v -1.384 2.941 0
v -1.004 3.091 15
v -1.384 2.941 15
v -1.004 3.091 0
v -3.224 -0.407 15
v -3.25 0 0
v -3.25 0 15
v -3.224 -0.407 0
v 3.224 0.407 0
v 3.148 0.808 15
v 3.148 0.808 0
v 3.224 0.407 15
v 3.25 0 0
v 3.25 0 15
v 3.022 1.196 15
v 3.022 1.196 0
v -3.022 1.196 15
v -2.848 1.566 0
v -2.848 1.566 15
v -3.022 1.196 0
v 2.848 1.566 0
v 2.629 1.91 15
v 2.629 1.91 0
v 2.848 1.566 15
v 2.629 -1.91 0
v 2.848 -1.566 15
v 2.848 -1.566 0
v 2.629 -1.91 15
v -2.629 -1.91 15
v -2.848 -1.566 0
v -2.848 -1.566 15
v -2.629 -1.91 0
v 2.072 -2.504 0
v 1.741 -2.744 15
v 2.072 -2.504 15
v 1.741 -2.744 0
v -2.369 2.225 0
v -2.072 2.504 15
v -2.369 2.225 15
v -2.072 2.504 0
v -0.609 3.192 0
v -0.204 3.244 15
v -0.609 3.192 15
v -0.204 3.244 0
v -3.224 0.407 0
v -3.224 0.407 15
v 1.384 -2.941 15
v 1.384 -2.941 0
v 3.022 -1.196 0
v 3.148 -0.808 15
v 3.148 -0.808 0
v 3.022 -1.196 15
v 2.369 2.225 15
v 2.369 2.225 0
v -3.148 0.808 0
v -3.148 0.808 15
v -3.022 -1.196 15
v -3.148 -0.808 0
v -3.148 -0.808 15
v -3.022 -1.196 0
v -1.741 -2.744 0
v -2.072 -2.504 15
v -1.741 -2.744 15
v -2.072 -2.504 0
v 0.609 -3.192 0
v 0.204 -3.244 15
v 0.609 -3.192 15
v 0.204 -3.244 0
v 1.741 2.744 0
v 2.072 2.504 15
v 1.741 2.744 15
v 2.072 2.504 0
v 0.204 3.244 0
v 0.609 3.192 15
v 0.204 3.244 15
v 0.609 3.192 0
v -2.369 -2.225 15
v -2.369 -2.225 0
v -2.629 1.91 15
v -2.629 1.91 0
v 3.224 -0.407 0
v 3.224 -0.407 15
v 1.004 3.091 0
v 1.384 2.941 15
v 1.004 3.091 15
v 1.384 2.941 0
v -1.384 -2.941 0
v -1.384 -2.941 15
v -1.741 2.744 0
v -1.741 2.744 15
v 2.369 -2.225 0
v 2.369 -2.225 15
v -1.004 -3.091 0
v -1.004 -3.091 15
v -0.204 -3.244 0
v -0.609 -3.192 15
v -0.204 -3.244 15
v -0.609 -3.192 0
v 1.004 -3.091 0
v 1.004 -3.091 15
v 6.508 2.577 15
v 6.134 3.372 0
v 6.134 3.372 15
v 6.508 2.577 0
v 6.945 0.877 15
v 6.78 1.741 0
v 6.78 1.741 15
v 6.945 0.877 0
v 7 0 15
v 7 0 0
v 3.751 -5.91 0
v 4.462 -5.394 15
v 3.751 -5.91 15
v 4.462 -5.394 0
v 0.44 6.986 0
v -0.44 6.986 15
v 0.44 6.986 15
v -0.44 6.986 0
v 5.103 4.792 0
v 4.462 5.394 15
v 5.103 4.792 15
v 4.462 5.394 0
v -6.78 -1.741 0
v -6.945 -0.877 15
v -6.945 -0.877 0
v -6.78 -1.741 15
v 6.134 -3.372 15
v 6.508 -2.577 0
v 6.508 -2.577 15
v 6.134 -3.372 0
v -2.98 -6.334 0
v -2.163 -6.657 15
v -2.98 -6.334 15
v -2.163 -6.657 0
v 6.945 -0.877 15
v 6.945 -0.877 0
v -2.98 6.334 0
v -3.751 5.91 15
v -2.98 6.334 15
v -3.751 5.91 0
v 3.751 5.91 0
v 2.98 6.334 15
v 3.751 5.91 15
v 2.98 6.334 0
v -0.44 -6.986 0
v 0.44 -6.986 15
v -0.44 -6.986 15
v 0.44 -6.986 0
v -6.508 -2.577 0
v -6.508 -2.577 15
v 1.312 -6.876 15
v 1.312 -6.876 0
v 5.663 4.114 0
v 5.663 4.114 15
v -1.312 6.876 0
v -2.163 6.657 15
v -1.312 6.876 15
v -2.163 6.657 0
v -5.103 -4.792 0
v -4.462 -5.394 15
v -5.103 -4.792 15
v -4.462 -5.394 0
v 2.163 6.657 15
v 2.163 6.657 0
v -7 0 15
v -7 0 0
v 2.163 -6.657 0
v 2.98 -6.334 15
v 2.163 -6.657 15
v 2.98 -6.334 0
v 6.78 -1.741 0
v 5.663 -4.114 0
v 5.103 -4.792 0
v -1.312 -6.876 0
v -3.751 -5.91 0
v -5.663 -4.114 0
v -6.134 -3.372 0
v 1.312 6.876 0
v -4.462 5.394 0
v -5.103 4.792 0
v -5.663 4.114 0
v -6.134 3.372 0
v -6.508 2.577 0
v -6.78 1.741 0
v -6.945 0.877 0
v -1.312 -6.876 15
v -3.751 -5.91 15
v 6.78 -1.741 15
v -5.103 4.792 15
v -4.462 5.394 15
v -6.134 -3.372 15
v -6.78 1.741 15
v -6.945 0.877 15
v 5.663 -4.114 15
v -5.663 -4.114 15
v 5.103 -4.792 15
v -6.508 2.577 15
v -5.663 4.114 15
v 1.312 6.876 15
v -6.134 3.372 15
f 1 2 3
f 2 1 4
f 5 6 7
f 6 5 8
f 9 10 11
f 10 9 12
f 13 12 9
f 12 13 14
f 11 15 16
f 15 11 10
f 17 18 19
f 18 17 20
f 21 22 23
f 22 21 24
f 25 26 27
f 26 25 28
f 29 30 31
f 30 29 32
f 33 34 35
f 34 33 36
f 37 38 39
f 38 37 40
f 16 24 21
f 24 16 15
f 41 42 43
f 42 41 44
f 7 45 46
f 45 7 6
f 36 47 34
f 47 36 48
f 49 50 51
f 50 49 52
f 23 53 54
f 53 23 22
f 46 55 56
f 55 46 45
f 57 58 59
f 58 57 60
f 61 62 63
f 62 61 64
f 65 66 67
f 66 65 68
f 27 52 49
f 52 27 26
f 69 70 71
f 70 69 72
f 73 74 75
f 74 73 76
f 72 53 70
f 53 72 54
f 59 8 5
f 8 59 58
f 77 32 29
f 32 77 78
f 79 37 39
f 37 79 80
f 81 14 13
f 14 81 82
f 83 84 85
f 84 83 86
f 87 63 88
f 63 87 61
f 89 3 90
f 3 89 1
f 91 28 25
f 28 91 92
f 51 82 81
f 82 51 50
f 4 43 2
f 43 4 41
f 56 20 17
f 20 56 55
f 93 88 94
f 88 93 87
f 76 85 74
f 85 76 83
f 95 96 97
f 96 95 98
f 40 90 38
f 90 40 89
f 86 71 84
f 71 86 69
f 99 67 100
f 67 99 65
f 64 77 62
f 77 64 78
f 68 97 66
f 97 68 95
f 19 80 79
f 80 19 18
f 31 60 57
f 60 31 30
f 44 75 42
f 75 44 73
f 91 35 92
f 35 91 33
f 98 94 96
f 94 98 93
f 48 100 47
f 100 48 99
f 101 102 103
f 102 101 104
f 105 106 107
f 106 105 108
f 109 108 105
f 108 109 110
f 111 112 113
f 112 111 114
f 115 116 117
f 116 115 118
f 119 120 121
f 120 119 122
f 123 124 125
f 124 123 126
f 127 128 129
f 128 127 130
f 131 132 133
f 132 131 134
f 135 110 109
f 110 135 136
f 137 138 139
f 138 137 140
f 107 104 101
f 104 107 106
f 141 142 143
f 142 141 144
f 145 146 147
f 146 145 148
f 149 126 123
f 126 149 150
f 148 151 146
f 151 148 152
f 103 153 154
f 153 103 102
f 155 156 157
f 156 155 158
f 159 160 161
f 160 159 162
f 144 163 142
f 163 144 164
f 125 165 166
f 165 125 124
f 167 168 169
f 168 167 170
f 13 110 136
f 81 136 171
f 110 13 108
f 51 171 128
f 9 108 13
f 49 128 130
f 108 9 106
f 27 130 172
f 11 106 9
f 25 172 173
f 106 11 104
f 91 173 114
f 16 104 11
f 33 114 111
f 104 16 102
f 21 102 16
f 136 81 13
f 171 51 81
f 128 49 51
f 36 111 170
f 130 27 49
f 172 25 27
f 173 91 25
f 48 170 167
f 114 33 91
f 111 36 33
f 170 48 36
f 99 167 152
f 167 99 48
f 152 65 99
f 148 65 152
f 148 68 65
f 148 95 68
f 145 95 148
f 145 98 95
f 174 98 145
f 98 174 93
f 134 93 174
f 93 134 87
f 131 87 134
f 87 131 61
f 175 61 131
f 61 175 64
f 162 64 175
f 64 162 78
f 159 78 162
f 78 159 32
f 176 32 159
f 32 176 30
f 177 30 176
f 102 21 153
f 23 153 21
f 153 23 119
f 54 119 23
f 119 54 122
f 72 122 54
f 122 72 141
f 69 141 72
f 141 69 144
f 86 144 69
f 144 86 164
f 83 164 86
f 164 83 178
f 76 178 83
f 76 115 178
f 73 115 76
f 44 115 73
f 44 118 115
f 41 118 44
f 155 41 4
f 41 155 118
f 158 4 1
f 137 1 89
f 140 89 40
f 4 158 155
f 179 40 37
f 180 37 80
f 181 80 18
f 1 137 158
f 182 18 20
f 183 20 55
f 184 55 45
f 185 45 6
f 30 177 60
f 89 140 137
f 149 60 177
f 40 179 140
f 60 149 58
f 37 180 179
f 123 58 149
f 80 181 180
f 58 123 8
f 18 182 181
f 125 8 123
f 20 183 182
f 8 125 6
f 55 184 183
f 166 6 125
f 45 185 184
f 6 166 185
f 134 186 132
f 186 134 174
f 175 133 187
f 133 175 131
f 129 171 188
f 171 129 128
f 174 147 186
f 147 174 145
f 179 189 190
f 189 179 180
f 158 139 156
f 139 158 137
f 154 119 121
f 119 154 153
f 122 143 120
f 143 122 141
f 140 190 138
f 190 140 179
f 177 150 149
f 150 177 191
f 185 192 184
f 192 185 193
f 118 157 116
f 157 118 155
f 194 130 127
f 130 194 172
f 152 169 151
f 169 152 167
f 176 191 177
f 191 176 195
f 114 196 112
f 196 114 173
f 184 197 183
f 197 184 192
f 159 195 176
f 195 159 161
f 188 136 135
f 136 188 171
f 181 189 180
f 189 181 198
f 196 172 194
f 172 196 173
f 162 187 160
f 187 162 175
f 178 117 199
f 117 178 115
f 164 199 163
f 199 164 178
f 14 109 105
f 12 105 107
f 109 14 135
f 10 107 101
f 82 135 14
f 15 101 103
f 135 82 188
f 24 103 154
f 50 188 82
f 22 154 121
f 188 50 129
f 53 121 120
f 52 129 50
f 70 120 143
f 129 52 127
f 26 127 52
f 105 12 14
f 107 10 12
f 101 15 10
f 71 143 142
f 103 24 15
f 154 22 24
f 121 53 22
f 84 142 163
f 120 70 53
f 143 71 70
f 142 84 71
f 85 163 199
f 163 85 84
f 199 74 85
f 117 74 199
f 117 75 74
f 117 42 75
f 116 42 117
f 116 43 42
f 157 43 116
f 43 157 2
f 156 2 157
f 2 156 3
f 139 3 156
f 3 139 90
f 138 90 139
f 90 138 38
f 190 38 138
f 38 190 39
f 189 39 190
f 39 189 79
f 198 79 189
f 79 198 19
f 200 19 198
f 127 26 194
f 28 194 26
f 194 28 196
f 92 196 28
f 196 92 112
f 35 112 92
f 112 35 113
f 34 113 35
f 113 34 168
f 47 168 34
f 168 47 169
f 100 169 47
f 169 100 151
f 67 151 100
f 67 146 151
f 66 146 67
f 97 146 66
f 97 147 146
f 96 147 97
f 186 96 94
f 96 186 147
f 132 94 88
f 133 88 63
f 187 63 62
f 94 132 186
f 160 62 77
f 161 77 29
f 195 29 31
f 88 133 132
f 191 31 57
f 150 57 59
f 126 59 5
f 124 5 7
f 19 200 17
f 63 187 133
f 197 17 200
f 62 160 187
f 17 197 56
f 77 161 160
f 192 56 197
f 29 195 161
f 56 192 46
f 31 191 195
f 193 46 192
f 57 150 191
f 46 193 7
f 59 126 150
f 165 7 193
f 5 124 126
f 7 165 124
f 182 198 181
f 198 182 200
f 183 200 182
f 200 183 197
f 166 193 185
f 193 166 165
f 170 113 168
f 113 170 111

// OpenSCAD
$fn = 50;


difference() {
	union() {
		*color(alpha = 1.0000000000, c = "gray") {
			translate(v = [0, 7, 0]) {
				linear_extrude(height = 1) {
					text(font = "Arial:style=Bold", halign = "center", size = 4.5000000000, text = "COMMENT plate main", valign = "center");
				}
			}
		}
		cylinder(h = 15, r = 7.0000000000);
	}
	union() {
		*color(alpha = 1.0000000000, c = "gray") {
			translate(v = [0, 7, 0]) {
				linear_extrude(height = 1) {
					text(font = "Arial:style=Bold", halign = "center", size = 4.5000000000, text = "COMMENT holes main", valign = "center");
				}
			}
		}
		translate(v = [0, 0, -100]) {
			cylinder(h = 200, r = 3.2500000000);
		}
		translate(v = [0, 0, -100]) {
			cylinder(h = 200, r = 1.8000000000);
		}
	}
}
